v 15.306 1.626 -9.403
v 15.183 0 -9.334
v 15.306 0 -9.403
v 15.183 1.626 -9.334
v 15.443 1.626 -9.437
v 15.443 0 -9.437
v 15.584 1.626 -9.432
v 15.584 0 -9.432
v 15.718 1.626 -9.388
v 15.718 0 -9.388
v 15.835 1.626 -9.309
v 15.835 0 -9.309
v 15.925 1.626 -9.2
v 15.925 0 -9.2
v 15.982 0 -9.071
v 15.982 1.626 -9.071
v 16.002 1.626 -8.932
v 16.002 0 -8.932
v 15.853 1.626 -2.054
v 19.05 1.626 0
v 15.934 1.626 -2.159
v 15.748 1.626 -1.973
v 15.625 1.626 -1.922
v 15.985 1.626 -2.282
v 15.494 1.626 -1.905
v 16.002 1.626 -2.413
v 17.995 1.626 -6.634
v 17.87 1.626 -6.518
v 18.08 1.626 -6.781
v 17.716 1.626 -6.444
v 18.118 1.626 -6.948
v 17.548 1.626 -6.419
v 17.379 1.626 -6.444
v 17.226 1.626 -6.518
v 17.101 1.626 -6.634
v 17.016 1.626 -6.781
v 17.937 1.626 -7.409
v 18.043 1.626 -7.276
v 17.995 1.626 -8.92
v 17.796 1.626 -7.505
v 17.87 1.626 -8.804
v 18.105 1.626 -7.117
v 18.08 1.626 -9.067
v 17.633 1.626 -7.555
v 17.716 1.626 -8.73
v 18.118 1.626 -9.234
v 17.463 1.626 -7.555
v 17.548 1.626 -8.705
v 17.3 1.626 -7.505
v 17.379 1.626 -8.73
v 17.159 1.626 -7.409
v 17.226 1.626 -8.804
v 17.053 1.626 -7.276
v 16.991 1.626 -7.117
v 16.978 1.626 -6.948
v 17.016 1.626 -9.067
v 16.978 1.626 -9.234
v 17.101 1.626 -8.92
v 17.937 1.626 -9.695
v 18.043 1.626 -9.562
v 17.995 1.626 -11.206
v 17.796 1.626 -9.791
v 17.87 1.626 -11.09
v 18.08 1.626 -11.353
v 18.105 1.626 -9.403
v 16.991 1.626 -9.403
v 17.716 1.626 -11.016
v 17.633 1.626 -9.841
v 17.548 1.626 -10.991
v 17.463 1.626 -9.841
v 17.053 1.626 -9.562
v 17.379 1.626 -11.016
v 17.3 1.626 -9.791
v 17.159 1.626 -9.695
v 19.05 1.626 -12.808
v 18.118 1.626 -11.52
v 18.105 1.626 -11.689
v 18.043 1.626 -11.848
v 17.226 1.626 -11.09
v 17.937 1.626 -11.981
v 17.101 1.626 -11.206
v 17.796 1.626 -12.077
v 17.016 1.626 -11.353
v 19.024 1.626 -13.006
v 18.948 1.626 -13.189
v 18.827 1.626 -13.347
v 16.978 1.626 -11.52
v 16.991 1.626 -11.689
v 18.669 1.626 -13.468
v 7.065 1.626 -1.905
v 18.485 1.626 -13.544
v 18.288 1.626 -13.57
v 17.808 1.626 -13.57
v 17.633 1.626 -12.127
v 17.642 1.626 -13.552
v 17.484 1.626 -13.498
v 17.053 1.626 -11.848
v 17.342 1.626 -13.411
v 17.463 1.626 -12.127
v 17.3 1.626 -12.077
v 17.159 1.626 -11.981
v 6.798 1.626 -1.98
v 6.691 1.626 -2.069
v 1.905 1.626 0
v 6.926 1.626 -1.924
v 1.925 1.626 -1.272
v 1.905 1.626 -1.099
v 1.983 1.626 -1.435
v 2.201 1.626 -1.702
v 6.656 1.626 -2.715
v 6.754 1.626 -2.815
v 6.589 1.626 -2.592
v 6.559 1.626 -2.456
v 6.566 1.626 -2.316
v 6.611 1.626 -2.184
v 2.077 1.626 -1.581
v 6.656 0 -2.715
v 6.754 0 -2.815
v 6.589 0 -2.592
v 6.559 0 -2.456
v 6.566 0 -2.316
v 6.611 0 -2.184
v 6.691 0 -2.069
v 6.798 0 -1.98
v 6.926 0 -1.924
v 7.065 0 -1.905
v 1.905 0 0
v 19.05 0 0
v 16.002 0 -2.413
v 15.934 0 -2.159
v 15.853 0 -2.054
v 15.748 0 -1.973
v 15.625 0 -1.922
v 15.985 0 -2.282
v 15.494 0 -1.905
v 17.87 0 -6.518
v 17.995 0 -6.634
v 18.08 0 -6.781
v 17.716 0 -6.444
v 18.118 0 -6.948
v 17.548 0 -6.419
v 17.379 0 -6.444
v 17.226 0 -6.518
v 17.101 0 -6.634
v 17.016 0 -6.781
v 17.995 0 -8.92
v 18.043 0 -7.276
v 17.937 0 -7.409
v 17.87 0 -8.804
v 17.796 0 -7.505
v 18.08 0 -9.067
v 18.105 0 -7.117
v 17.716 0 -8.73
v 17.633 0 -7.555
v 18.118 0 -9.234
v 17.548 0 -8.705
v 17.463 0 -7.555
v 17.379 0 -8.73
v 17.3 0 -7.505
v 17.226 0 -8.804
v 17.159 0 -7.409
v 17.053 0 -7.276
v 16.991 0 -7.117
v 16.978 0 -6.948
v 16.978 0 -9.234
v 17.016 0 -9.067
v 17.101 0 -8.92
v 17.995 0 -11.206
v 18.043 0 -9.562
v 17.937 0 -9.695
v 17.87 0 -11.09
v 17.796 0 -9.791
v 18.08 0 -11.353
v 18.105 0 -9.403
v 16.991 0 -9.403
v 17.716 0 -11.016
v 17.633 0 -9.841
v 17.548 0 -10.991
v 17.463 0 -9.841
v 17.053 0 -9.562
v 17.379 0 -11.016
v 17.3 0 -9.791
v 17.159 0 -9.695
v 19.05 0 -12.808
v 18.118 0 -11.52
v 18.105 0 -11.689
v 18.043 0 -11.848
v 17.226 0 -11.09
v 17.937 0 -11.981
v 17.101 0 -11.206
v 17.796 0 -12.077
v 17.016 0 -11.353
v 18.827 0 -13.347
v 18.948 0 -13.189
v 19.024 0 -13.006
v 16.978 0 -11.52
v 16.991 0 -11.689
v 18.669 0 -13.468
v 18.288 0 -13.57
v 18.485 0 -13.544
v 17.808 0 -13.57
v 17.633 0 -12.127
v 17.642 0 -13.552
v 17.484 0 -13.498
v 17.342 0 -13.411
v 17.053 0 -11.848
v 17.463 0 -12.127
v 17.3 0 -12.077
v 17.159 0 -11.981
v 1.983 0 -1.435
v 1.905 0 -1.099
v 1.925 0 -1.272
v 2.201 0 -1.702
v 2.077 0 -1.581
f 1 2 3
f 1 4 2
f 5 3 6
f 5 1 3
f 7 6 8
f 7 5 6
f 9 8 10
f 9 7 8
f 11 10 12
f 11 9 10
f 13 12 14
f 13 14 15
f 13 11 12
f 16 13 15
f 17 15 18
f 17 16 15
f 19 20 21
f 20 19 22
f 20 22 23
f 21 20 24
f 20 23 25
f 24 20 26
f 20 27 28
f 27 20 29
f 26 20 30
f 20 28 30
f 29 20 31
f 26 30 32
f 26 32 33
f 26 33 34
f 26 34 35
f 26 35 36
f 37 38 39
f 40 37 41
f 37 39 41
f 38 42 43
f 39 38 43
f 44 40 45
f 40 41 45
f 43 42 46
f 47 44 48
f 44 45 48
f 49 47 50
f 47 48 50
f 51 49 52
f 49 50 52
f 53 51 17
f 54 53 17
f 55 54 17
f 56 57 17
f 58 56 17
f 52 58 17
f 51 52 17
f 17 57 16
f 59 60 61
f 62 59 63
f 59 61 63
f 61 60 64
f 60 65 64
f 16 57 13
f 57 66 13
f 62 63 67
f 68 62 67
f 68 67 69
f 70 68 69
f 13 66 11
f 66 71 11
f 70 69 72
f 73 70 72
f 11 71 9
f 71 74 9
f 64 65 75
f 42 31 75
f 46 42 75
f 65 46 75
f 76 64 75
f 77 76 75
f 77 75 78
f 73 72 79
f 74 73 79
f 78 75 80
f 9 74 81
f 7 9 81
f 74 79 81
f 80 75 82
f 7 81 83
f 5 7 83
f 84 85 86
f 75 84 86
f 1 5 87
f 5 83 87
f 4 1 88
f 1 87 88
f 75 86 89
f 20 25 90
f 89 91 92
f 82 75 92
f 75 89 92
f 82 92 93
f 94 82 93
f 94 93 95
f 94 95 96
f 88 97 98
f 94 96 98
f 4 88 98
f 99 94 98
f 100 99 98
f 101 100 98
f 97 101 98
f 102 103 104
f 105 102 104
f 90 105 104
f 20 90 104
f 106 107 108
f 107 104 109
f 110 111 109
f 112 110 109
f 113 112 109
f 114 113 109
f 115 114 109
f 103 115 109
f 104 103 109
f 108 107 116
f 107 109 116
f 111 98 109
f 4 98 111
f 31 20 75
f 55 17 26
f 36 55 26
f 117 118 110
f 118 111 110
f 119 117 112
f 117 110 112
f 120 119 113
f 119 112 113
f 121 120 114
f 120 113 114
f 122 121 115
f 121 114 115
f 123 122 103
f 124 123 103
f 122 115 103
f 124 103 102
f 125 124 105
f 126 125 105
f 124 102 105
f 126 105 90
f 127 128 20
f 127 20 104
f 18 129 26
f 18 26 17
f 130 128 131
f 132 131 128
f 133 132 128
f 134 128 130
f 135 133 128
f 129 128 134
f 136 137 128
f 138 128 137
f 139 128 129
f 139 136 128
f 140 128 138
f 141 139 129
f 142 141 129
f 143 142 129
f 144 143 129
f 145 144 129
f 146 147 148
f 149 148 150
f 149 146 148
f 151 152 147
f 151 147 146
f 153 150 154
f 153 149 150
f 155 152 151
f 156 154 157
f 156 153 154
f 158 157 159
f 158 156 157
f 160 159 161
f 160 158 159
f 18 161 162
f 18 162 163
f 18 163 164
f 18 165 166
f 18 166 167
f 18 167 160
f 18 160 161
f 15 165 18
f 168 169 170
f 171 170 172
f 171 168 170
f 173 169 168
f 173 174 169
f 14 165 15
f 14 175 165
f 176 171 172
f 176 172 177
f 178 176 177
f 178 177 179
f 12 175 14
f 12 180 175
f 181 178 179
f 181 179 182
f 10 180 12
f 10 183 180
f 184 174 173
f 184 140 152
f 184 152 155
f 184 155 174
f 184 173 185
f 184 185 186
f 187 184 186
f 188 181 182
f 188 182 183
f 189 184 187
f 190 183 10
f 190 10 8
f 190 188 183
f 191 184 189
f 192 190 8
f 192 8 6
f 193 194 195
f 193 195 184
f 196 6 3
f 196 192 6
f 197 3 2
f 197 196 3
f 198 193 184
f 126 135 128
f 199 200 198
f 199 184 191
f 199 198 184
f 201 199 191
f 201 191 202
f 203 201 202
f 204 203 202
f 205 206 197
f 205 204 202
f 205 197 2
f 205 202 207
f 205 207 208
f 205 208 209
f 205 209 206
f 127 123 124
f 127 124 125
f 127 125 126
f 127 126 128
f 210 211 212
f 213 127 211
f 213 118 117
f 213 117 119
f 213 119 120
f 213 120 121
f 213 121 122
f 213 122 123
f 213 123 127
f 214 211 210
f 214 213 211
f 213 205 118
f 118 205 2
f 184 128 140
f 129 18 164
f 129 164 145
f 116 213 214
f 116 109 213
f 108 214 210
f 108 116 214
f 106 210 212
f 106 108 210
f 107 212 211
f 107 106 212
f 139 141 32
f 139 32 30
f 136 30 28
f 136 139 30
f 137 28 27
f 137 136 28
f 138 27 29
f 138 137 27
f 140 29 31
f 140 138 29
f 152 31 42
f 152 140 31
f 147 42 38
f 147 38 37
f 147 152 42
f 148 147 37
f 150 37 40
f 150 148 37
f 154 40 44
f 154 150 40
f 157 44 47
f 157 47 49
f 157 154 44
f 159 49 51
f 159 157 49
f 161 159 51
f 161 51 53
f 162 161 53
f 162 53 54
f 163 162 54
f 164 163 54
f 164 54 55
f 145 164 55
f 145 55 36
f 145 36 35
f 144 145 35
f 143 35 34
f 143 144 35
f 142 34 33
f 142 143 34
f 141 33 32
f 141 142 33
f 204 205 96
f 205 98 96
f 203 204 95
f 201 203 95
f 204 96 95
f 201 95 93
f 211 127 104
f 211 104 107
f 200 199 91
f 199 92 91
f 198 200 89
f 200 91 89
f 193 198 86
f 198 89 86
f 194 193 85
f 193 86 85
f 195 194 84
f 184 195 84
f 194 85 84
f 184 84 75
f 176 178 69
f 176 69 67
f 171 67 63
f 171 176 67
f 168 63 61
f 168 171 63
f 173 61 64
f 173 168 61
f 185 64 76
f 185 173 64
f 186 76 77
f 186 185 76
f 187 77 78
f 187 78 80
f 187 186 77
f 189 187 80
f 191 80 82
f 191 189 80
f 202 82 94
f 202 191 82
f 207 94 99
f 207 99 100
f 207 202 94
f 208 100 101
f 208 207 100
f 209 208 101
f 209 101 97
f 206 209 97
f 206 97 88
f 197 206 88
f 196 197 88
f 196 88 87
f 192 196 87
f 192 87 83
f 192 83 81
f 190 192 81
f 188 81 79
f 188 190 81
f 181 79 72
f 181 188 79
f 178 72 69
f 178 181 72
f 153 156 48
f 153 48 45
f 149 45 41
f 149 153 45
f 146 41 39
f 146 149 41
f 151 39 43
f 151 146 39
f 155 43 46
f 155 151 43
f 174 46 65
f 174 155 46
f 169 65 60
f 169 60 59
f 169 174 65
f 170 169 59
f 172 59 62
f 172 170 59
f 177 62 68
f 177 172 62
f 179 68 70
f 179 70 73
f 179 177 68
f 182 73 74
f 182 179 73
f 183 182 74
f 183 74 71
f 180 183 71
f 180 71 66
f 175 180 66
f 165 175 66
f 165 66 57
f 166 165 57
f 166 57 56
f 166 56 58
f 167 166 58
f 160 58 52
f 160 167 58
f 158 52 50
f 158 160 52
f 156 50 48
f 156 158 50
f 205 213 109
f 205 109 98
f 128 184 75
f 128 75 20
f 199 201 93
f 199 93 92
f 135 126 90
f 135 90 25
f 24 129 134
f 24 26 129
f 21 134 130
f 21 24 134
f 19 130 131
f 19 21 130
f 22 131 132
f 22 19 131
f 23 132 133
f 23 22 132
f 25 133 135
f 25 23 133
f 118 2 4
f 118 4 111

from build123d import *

# Parameters (mm, degrees)
SKETCH1_R           = 0.5715
BOSS_EXTRUDE1_DEPTH = 1.6256
FILLET1_R           = 0.508
FILLET2_R           = 0.762


with BuildPart() as part:
    # Sketch1 → Boss-Extrude1 (new body)
    with BuildSketch(Plane(origin=(0, 0, 0), x_dir=(1, 0, 0), z_dir=(0, 1, 0))):
        Polygon((1.905, 1.4732), (17.54785055, 13.570337759), (19.05, 13.570337759), (19.05, 0), (1.905, 0), align=None)
        with Locations(Location((17.54785055, 11.562216741, 0), (0, 0, 270))):
            Circle(SKETCH1_R, mode=Mode.SUBTRACT)
        with Locations(Location((17.54785055, 9.276216741, 0), (0, 0, 270))):
            Circle(SKETCH1_R, mode=Mode.SUBTRACT)
        with Locations(Location((17.54785055, 6.990216741, 0), (0, 0, 270))):
            Circle(SKETCH1_R, mode=Mode.SUBTRACT)
        Polygon((5.577391241, 1.905), (16.002, 1.905), (16.002, 9.96669744), align=None, mode=Mode.SUBTRACT)
    extrude(amount=BOSS_EXTRUDE1_DEPTH)

    # Fillet1
    fillet1_edges = [part.edges().sort_by_distance(p)[0] for p in [
        (16.002, 0.8128, -9.96669744),
        (5.577391241, 0.8128, -1.905),
        (16.002, 0.8128, -1.905),
    ]]
    fillet(fillet1_edges, radius=FILLET1_R)

    # Fillet2
    fillet2_edges = [part.edges().sort_by_distance(p)[0] for p in [
        (1.905, 0.8128, -1.4732),
        (17.54785055, 0.8128, -13.570337759),
        (19.05, 0.8128, -13.570337759),
    ]]
    fillet(fillet2_edges, radius=FILLET2_R)


solid = part.part
